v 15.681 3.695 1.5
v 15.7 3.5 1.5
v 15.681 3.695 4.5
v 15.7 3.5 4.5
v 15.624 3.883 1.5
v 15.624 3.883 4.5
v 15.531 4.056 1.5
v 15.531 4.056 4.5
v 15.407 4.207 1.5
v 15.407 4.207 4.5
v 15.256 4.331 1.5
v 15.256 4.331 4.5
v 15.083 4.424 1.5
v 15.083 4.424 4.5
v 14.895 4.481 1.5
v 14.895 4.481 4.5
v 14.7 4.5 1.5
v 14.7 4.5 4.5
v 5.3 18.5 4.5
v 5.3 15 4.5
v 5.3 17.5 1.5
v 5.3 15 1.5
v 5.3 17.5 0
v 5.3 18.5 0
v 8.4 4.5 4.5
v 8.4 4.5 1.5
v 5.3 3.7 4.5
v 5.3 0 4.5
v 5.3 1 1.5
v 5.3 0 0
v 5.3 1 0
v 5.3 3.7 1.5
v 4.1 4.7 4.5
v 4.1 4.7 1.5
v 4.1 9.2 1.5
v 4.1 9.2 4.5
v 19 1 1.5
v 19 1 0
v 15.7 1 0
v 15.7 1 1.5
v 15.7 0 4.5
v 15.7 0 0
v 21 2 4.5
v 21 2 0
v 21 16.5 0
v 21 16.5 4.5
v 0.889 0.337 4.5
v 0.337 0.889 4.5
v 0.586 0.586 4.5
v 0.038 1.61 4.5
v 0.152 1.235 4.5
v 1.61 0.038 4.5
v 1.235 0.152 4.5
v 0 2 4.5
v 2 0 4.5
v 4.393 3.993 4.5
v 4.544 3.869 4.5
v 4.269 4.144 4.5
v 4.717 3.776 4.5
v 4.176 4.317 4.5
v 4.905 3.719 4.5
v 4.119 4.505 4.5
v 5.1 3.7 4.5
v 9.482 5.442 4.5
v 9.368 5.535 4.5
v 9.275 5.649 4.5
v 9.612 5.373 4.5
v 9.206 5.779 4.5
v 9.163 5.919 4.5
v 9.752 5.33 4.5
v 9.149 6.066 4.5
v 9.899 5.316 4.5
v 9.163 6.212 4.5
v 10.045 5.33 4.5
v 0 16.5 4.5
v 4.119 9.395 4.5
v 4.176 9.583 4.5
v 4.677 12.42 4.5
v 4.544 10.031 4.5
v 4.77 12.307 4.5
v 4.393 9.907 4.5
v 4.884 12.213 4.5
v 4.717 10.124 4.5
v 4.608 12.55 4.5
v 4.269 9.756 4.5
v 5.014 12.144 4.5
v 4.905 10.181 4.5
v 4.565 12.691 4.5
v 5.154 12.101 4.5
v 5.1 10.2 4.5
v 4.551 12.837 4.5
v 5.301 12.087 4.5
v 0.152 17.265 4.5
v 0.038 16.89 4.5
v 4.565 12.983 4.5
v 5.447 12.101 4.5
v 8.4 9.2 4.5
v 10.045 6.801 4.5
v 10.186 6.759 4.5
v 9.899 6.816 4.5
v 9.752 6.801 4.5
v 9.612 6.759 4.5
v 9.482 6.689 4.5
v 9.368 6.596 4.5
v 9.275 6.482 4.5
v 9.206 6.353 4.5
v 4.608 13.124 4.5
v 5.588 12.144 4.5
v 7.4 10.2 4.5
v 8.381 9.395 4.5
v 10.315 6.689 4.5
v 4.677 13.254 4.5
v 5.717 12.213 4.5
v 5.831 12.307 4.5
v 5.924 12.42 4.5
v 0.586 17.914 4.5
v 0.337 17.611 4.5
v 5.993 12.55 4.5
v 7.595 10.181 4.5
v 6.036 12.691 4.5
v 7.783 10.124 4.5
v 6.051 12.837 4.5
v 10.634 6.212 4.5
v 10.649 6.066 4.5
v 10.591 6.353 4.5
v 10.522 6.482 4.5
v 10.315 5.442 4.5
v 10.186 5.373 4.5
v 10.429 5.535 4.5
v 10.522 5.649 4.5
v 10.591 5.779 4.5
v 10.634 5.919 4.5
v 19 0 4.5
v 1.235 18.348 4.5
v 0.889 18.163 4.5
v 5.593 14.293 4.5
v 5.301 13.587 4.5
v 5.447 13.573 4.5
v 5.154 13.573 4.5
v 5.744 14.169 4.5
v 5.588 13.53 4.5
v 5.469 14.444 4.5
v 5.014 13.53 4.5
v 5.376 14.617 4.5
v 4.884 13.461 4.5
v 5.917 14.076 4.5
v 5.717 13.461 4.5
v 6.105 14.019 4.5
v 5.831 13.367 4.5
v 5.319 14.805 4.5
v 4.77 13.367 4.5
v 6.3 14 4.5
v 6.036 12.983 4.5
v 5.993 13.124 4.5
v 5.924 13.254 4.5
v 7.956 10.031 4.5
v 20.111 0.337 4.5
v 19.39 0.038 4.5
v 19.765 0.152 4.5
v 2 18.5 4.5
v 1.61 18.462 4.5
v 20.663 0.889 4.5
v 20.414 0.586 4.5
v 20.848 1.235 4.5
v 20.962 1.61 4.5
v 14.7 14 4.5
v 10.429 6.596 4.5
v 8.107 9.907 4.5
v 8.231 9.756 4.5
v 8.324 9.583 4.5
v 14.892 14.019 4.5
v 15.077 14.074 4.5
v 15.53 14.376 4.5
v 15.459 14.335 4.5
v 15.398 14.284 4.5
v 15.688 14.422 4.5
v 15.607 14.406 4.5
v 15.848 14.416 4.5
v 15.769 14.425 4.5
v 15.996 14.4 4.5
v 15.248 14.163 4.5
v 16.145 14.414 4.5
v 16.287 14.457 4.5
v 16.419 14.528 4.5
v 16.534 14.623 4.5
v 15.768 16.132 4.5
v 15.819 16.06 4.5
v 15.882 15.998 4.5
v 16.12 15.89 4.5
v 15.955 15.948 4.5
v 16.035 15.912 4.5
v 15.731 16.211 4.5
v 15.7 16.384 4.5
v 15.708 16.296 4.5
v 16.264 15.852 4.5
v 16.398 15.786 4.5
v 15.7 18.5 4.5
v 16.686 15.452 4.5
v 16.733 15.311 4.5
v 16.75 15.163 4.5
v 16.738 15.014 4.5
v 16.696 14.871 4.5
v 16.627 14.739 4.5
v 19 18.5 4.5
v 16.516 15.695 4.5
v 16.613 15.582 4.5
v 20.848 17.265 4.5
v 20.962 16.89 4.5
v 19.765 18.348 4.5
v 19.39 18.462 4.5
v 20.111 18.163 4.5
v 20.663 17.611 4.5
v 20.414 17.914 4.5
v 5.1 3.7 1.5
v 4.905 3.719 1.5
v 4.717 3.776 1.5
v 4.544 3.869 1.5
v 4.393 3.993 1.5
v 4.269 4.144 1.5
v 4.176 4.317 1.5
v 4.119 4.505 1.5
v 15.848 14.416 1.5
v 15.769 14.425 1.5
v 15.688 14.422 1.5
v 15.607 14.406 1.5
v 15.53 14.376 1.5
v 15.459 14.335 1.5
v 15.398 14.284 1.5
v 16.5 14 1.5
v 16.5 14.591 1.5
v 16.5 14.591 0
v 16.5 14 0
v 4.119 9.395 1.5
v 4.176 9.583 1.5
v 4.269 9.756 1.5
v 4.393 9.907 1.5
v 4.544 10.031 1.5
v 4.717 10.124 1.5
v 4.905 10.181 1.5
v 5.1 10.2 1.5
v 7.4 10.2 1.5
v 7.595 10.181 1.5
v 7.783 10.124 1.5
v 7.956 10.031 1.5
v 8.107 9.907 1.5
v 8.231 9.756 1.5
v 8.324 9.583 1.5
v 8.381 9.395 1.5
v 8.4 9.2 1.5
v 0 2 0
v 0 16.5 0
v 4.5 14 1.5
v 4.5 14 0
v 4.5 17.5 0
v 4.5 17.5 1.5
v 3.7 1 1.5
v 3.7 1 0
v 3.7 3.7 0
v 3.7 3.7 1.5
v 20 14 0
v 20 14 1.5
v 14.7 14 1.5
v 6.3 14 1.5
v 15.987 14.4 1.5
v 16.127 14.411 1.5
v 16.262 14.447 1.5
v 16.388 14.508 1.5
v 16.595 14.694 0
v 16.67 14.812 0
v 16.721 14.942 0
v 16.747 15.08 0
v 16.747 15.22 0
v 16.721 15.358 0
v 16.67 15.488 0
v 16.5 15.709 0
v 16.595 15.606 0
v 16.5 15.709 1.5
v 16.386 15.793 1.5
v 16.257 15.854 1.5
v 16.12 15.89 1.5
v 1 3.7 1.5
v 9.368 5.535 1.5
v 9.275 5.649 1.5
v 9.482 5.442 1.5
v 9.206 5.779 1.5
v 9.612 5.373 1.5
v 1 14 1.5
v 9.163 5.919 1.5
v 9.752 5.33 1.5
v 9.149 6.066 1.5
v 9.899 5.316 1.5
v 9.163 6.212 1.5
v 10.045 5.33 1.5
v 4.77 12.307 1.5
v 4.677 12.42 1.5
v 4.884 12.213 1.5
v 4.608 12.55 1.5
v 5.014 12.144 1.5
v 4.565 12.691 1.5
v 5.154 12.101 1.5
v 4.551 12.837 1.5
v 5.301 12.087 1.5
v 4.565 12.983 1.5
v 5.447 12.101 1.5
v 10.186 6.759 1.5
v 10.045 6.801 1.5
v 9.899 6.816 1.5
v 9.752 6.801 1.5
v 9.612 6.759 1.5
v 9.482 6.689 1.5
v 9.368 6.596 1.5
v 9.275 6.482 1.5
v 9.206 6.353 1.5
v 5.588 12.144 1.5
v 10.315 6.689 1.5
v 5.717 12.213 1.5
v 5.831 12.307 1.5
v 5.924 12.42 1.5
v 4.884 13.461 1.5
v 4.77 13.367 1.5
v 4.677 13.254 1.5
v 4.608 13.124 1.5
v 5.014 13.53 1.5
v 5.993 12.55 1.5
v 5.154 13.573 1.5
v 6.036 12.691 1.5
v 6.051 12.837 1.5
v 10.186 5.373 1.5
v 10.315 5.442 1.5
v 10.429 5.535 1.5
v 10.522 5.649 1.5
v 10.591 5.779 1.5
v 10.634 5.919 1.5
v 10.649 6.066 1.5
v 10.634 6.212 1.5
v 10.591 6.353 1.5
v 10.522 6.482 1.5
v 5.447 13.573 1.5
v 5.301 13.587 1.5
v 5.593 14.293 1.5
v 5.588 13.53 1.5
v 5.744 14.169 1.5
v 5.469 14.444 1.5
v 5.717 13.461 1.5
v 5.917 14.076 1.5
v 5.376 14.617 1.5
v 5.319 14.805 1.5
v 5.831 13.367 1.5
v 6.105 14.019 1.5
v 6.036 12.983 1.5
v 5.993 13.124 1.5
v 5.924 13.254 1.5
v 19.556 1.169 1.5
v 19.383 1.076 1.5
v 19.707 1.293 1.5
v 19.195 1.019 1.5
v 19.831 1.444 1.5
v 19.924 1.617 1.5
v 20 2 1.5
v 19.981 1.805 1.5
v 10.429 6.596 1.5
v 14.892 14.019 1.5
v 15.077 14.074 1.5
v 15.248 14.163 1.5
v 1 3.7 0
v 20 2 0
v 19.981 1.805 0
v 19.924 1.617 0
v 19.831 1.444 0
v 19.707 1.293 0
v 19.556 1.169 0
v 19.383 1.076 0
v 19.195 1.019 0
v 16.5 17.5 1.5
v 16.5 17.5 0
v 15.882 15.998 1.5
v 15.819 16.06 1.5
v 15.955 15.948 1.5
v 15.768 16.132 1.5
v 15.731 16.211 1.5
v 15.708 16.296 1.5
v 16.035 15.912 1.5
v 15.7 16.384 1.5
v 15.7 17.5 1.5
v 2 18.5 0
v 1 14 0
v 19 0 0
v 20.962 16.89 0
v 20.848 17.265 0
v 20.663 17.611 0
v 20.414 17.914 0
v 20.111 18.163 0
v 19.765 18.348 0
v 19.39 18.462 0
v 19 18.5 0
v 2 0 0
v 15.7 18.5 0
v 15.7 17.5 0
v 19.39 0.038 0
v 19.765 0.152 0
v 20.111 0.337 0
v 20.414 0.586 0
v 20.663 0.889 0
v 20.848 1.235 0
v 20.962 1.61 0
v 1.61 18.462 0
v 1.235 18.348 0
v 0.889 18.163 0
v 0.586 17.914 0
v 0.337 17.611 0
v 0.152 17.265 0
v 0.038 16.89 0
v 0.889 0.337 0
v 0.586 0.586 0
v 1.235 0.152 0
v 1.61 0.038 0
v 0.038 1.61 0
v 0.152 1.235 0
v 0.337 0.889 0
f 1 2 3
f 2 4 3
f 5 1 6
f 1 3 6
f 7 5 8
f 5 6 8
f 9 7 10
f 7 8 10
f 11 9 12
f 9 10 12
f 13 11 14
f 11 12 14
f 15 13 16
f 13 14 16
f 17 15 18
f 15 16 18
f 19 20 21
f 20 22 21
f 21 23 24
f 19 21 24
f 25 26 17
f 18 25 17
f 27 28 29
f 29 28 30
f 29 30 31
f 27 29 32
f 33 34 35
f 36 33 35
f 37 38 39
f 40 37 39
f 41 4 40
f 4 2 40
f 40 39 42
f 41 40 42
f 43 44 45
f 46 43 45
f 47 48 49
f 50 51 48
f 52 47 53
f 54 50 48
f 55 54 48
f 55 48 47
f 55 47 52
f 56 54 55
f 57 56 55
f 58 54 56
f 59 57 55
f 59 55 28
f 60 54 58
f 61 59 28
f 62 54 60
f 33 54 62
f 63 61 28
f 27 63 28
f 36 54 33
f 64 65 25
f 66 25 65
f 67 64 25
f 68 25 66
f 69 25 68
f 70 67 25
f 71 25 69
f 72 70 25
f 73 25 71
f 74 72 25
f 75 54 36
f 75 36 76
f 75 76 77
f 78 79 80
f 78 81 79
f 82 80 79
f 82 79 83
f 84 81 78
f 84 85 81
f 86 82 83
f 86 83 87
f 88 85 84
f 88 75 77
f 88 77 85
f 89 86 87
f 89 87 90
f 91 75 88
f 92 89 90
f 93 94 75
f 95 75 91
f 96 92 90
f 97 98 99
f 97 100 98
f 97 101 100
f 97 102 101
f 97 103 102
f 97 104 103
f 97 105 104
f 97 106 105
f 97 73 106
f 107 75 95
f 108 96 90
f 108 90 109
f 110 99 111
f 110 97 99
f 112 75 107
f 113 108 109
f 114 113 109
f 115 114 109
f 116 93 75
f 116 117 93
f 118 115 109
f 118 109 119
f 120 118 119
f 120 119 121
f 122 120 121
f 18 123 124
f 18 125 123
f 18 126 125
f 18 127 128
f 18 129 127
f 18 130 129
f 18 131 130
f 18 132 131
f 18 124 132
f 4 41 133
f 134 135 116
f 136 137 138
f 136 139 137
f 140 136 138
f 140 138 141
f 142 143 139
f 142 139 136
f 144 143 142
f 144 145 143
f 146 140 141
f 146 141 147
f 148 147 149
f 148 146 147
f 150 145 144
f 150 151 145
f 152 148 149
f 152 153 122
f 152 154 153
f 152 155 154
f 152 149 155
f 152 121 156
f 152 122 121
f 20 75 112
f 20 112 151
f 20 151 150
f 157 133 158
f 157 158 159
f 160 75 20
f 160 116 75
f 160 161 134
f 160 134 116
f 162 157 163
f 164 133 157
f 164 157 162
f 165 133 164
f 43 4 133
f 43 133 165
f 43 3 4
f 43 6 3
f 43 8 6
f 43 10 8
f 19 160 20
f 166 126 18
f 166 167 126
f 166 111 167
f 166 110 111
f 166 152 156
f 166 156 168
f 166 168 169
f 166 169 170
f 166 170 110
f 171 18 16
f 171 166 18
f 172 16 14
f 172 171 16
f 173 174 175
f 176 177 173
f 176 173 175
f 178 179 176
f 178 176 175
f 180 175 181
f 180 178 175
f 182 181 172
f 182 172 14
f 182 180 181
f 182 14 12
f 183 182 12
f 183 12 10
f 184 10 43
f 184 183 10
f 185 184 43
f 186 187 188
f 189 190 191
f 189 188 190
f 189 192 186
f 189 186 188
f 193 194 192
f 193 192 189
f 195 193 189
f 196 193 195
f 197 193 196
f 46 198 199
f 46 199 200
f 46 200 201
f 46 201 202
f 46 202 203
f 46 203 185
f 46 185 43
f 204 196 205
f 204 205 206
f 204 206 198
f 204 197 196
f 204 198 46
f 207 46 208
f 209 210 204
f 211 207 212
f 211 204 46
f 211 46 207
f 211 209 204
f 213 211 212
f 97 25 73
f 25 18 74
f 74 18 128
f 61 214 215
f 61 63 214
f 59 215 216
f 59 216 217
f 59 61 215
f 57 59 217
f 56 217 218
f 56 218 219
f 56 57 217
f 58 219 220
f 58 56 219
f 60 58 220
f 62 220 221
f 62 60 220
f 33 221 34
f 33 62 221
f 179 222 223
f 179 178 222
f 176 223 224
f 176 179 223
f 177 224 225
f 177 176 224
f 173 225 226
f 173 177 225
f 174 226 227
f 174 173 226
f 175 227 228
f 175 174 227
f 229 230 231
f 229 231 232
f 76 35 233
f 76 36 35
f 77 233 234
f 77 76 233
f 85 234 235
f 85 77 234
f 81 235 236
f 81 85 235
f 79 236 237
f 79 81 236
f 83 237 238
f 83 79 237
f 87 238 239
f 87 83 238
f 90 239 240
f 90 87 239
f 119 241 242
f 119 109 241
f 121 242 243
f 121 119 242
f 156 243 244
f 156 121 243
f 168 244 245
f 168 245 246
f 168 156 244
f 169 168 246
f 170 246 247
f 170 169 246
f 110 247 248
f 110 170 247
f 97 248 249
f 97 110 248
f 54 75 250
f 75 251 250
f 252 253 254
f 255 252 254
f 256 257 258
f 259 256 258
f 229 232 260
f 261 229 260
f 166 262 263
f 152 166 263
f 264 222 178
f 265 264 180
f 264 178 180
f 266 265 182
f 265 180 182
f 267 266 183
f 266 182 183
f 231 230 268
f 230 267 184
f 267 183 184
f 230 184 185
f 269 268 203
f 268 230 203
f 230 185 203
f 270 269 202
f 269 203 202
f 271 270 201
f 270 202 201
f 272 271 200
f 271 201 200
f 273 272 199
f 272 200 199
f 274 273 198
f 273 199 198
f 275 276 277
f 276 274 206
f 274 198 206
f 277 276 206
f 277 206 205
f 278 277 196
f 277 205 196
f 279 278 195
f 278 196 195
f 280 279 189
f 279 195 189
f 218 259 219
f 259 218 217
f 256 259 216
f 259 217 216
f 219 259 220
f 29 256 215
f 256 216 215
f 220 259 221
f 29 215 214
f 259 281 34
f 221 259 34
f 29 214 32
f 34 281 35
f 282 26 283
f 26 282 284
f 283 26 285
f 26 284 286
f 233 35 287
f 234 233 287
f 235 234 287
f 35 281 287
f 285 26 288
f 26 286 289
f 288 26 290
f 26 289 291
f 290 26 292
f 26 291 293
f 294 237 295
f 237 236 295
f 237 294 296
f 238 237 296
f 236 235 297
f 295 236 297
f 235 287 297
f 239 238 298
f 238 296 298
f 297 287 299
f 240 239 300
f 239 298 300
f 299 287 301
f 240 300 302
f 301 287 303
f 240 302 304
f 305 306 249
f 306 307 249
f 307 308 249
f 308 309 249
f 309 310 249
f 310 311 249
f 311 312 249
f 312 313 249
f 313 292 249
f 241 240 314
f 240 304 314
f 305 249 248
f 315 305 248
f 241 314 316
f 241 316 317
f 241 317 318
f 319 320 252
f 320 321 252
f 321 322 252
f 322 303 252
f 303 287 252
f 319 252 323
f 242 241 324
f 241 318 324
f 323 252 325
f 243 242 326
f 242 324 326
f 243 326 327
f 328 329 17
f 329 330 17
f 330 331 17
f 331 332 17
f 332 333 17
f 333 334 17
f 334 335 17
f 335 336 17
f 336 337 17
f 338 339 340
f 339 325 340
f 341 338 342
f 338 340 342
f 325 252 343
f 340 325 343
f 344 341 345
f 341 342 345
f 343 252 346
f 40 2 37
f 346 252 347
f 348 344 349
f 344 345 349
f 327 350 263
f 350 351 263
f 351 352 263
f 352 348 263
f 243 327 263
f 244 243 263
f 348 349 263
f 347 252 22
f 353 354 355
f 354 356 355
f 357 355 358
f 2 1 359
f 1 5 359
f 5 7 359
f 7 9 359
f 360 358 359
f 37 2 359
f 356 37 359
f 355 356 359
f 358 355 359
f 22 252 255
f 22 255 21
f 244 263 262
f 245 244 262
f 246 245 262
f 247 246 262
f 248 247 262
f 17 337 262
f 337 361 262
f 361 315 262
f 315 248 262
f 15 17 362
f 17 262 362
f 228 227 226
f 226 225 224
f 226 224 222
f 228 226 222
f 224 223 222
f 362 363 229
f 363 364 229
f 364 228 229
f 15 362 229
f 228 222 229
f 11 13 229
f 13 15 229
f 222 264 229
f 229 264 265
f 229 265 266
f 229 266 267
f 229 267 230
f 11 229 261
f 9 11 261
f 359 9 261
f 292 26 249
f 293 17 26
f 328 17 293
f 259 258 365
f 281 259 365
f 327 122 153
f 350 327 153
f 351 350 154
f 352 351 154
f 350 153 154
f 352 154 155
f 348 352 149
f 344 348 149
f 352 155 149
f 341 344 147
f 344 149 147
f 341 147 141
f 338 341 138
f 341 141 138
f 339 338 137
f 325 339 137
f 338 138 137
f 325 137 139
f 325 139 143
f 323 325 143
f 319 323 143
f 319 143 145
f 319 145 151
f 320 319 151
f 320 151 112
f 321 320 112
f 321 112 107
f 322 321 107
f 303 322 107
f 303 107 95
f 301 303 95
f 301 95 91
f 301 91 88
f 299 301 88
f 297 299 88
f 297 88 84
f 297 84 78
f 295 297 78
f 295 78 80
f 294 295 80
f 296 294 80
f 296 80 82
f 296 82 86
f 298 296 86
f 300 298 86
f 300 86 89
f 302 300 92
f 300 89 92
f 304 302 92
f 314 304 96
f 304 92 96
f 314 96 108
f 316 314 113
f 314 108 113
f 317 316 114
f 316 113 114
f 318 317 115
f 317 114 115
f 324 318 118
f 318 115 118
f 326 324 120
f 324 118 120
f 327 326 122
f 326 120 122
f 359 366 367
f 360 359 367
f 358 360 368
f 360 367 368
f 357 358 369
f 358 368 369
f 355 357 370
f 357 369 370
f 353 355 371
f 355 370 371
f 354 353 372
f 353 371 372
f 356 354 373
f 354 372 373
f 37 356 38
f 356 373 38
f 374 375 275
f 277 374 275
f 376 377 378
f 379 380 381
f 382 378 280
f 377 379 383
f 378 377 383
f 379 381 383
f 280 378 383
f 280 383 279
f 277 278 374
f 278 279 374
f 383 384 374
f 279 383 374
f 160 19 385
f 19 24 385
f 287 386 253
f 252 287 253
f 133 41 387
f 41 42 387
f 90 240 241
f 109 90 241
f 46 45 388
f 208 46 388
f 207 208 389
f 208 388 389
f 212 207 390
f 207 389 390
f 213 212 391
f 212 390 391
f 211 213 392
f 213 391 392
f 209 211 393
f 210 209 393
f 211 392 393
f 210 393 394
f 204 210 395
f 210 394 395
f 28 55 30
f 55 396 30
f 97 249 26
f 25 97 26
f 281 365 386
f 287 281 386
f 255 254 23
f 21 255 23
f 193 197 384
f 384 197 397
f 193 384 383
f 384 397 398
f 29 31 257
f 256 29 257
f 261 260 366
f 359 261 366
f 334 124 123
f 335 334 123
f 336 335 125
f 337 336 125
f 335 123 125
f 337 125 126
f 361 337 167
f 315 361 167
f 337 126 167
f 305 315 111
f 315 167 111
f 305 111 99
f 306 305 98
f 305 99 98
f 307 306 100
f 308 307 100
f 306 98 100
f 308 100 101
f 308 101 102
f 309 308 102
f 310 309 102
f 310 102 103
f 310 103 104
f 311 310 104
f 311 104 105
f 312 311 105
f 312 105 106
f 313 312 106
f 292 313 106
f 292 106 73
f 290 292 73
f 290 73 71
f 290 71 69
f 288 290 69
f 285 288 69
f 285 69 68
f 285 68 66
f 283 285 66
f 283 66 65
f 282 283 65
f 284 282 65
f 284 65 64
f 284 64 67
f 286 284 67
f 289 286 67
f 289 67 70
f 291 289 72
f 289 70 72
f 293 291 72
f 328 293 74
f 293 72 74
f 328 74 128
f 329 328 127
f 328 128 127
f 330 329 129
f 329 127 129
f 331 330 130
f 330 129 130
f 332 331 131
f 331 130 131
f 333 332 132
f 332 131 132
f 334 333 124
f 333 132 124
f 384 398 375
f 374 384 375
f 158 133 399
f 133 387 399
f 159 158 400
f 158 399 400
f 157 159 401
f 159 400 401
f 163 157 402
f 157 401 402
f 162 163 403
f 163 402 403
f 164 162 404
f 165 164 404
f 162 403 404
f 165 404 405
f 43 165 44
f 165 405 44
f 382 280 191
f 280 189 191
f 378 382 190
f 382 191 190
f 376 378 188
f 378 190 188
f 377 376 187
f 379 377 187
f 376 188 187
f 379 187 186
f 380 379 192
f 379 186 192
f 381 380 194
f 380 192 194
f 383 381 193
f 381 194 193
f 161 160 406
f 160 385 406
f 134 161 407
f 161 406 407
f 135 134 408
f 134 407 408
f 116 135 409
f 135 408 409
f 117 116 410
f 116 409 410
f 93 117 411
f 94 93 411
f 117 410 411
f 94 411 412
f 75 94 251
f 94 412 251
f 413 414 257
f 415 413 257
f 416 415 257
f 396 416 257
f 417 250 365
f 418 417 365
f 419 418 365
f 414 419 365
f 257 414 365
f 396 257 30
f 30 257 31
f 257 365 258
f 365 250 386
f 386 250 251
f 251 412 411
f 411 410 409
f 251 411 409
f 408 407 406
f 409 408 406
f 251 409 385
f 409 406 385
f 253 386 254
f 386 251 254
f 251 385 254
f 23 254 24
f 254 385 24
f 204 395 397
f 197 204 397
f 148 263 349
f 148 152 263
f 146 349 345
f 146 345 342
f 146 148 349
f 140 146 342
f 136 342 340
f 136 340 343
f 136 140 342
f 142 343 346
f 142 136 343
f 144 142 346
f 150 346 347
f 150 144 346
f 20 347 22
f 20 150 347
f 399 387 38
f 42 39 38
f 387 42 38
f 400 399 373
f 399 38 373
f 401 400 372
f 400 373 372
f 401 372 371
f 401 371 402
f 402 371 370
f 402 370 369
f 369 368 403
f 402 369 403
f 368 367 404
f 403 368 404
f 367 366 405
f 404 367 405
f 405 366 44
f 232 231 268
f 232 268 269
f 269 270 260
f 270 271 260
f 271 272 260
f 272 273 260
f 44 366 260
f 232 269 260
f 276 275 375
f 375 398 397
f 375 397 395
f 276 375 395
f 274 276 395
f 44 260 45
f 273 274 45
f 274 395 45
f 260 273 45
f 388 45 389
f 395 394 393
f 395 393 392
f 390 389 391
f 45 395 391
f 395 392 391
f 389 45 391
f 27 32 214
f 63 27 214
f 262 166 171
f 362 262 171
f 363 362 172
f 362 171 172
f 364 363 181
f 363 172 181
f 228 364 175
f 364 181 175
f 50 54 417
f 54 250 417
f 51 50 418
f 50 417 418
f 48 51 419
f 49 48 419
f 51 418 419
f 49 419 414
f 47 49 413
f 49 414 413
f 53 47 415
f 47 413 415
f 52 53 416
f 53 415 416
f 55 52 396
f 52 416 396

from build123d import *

# Parameters (mm, degrees)
BOSS_EXTRUDE1_DEPTH   = 1.5
BOSS_EXTRUDE1_2_DEPTH = 1.5
BOSS_EXTRUDE2_DEPTH   = 3
FILLET1_R             = 1
SKETCH3_R             = 0.75
CUT_EXTRUDE2_DEPTH    = 29.346075566
FILLET2_R             = 0.5


with BuildPart() as part:
    # Sketch1 → Boss-Extrude1 (new body)
    with BuildSketch(Plane.XY):
        with BuildLine():
            Line((2, 0), (5.3, 0))
            Line((5.3, 0), (5.3, 1))
            Line((5.3, 1), (3.7, 1))
            Line((3.7, 1), (3.7, 3.7))
            Line((3.7, 3.7), (1, 3.7))
            Line((1, 3.7), (1, 14))
            Line((1, 14), (4.5, 14))
            Line((4.5, 14), (4.5, 17.5))
            Line((4.5, 17.5), (5.3, 17.5))
            Line((5.3, 17.5), (5.3, 18.5))
            Line((5.3, 18.5), (2, 18.5))
            ThreePointArc((2, 18.5), (0.585786438, 17.914213562), (0, 16.5))
            Line((0, 16.5), (0, 2))
            ThreePointArc((0, 2), (0.585786438, 0.585786438), (2, 0))
        make_face()
    extrude(amount=BOSS_EXTRUDE1_DEPTH)



with BuildPart() as body_2:
    # Sketch1 → Boss-Extrude1 2 (new body)
    with BuildSketch(Plane.XY):
        with BuildLine():
            Line((21, 2), (21, 16.5))
            ThreePointArc((21, 16.5), (20.414213562, 17.914213562), (19, 18.5))
            Line((19, 18.5), (15.7, 18.5))
            Line((15.7, 18.5), (15.7, 17.5))
            Line((15.7, 17.5), (16.5, 17.5))
            Line((16.5, 17.5), (16.5, 14))
            Line((16.5, 14), (20, 14))
            Line((20, 14), (20, 2))
            ThreePointArc((20, 2), (19.707106781, 1.292893219), (19, 1))
            Line((19, 1), (15.7, 1))
            Line((15.7, 1), (15.7, 0))
            Line((15.7, 0), (19, 0))
            ThreePointArc((19, 0), (20.414213562, 0.585786438), (21, 2))
        make_face()
    extrude(amount=BOSS_EXTRUDE1_2_DEPTH)


with BuildPart() as part_1:
    add(part.part)

    add(body_2.part)  # Boss-Extrude2 merges body 2
    # Sketch2 → Boss-Extrude2 (add)
    with BuildSketch(Plane.XY.offset(1.5)):
        with BuildLine():
            Line((19, 18.5), (15.7, 18.5))
            Line((15.7, 18.5), (15.7, 14))
            Line((15.7, 14), (5.3, 14))
            Line((5.3, 14), (5.3, 18.5))
            Line((5.3, 18.5), (2, 18.5))
            ThreePointArc((2, 18.5), (0.585786438, 17.914213562), (0, 16.5))
            Line((0, 16.5), (0, 2))
            ThreePointArc((0, 2), (0.585786438, 0.585786438), (2, 0))
            Line((2, 0), (5.3, 0))
            Line((5.3, 0), (5.3, 3.7))
            Line((5.3, 3.7), (4.1, 3.7))
            Line((4.1, 3.7), (4.1, 10.2))
            Line((4.1, 10.2), (8.4, 10.2))
            Line((8.4, 10.2), (8.4, 4.5))
            Line((8.4, 4.5), (15.7, 4.5))
            Line((15.7, 4.5), (15.7, 0))
            Line((15.7, 0), (19, 0))
            ThreePointArc((19, 0), (20.414213562, 0.585786438), (21, 2))
            Line((21, 2), (21, 16.5))
            ThreePointArc((21, 16.5), (20.414213562, 17.914213562), (19, 18.5))
        make_face()
    extrude(amount=BOSS_EXTRUDE2_DEPTH)

    # Fillet1
    fillet1_edges = [part_1.edges().sort_by_distance(p)[0] for p in [
        (15.7, 14, 3),
        (5.3, 14, 3),
        (4.1, 3.7, 3),
        (4.1, 10.2, 3),
        (8.4, 10.2, 3),
        (15.7, 4.5, 3),
    ]]
    fillet(fillet1_edges, radius=FILLET1_R)

    # Sketch3 → Cut-Extrude2 (cut, through all)
    with BuildSketch(Plane.XY.offset(4.5)):
        with Locations((9.898564471, 6.065663219)):
            Circle(SKETCH3_R)
        with Locations((5.3005196, 12.837006018)):
            Circle(SKETCH3_R)
        with Locations((16, 15.15)):
            Circle(SKETCH3_R)
    extrude(amount=-CUT_EXTRUDE2_DEPTH, mode=Mode.SUBTRACT)

    # Fillet2
    fillet2_edges = [part_1.edges().sort_by_distance(p)[0] for p in [
        (15.581422532, 14.527671386, 3),
        (15.7, 15.837386354, 3),
    ]]
    fillet(fillet2_edges, radius=FILLET2_R)


solid = part_1.part
